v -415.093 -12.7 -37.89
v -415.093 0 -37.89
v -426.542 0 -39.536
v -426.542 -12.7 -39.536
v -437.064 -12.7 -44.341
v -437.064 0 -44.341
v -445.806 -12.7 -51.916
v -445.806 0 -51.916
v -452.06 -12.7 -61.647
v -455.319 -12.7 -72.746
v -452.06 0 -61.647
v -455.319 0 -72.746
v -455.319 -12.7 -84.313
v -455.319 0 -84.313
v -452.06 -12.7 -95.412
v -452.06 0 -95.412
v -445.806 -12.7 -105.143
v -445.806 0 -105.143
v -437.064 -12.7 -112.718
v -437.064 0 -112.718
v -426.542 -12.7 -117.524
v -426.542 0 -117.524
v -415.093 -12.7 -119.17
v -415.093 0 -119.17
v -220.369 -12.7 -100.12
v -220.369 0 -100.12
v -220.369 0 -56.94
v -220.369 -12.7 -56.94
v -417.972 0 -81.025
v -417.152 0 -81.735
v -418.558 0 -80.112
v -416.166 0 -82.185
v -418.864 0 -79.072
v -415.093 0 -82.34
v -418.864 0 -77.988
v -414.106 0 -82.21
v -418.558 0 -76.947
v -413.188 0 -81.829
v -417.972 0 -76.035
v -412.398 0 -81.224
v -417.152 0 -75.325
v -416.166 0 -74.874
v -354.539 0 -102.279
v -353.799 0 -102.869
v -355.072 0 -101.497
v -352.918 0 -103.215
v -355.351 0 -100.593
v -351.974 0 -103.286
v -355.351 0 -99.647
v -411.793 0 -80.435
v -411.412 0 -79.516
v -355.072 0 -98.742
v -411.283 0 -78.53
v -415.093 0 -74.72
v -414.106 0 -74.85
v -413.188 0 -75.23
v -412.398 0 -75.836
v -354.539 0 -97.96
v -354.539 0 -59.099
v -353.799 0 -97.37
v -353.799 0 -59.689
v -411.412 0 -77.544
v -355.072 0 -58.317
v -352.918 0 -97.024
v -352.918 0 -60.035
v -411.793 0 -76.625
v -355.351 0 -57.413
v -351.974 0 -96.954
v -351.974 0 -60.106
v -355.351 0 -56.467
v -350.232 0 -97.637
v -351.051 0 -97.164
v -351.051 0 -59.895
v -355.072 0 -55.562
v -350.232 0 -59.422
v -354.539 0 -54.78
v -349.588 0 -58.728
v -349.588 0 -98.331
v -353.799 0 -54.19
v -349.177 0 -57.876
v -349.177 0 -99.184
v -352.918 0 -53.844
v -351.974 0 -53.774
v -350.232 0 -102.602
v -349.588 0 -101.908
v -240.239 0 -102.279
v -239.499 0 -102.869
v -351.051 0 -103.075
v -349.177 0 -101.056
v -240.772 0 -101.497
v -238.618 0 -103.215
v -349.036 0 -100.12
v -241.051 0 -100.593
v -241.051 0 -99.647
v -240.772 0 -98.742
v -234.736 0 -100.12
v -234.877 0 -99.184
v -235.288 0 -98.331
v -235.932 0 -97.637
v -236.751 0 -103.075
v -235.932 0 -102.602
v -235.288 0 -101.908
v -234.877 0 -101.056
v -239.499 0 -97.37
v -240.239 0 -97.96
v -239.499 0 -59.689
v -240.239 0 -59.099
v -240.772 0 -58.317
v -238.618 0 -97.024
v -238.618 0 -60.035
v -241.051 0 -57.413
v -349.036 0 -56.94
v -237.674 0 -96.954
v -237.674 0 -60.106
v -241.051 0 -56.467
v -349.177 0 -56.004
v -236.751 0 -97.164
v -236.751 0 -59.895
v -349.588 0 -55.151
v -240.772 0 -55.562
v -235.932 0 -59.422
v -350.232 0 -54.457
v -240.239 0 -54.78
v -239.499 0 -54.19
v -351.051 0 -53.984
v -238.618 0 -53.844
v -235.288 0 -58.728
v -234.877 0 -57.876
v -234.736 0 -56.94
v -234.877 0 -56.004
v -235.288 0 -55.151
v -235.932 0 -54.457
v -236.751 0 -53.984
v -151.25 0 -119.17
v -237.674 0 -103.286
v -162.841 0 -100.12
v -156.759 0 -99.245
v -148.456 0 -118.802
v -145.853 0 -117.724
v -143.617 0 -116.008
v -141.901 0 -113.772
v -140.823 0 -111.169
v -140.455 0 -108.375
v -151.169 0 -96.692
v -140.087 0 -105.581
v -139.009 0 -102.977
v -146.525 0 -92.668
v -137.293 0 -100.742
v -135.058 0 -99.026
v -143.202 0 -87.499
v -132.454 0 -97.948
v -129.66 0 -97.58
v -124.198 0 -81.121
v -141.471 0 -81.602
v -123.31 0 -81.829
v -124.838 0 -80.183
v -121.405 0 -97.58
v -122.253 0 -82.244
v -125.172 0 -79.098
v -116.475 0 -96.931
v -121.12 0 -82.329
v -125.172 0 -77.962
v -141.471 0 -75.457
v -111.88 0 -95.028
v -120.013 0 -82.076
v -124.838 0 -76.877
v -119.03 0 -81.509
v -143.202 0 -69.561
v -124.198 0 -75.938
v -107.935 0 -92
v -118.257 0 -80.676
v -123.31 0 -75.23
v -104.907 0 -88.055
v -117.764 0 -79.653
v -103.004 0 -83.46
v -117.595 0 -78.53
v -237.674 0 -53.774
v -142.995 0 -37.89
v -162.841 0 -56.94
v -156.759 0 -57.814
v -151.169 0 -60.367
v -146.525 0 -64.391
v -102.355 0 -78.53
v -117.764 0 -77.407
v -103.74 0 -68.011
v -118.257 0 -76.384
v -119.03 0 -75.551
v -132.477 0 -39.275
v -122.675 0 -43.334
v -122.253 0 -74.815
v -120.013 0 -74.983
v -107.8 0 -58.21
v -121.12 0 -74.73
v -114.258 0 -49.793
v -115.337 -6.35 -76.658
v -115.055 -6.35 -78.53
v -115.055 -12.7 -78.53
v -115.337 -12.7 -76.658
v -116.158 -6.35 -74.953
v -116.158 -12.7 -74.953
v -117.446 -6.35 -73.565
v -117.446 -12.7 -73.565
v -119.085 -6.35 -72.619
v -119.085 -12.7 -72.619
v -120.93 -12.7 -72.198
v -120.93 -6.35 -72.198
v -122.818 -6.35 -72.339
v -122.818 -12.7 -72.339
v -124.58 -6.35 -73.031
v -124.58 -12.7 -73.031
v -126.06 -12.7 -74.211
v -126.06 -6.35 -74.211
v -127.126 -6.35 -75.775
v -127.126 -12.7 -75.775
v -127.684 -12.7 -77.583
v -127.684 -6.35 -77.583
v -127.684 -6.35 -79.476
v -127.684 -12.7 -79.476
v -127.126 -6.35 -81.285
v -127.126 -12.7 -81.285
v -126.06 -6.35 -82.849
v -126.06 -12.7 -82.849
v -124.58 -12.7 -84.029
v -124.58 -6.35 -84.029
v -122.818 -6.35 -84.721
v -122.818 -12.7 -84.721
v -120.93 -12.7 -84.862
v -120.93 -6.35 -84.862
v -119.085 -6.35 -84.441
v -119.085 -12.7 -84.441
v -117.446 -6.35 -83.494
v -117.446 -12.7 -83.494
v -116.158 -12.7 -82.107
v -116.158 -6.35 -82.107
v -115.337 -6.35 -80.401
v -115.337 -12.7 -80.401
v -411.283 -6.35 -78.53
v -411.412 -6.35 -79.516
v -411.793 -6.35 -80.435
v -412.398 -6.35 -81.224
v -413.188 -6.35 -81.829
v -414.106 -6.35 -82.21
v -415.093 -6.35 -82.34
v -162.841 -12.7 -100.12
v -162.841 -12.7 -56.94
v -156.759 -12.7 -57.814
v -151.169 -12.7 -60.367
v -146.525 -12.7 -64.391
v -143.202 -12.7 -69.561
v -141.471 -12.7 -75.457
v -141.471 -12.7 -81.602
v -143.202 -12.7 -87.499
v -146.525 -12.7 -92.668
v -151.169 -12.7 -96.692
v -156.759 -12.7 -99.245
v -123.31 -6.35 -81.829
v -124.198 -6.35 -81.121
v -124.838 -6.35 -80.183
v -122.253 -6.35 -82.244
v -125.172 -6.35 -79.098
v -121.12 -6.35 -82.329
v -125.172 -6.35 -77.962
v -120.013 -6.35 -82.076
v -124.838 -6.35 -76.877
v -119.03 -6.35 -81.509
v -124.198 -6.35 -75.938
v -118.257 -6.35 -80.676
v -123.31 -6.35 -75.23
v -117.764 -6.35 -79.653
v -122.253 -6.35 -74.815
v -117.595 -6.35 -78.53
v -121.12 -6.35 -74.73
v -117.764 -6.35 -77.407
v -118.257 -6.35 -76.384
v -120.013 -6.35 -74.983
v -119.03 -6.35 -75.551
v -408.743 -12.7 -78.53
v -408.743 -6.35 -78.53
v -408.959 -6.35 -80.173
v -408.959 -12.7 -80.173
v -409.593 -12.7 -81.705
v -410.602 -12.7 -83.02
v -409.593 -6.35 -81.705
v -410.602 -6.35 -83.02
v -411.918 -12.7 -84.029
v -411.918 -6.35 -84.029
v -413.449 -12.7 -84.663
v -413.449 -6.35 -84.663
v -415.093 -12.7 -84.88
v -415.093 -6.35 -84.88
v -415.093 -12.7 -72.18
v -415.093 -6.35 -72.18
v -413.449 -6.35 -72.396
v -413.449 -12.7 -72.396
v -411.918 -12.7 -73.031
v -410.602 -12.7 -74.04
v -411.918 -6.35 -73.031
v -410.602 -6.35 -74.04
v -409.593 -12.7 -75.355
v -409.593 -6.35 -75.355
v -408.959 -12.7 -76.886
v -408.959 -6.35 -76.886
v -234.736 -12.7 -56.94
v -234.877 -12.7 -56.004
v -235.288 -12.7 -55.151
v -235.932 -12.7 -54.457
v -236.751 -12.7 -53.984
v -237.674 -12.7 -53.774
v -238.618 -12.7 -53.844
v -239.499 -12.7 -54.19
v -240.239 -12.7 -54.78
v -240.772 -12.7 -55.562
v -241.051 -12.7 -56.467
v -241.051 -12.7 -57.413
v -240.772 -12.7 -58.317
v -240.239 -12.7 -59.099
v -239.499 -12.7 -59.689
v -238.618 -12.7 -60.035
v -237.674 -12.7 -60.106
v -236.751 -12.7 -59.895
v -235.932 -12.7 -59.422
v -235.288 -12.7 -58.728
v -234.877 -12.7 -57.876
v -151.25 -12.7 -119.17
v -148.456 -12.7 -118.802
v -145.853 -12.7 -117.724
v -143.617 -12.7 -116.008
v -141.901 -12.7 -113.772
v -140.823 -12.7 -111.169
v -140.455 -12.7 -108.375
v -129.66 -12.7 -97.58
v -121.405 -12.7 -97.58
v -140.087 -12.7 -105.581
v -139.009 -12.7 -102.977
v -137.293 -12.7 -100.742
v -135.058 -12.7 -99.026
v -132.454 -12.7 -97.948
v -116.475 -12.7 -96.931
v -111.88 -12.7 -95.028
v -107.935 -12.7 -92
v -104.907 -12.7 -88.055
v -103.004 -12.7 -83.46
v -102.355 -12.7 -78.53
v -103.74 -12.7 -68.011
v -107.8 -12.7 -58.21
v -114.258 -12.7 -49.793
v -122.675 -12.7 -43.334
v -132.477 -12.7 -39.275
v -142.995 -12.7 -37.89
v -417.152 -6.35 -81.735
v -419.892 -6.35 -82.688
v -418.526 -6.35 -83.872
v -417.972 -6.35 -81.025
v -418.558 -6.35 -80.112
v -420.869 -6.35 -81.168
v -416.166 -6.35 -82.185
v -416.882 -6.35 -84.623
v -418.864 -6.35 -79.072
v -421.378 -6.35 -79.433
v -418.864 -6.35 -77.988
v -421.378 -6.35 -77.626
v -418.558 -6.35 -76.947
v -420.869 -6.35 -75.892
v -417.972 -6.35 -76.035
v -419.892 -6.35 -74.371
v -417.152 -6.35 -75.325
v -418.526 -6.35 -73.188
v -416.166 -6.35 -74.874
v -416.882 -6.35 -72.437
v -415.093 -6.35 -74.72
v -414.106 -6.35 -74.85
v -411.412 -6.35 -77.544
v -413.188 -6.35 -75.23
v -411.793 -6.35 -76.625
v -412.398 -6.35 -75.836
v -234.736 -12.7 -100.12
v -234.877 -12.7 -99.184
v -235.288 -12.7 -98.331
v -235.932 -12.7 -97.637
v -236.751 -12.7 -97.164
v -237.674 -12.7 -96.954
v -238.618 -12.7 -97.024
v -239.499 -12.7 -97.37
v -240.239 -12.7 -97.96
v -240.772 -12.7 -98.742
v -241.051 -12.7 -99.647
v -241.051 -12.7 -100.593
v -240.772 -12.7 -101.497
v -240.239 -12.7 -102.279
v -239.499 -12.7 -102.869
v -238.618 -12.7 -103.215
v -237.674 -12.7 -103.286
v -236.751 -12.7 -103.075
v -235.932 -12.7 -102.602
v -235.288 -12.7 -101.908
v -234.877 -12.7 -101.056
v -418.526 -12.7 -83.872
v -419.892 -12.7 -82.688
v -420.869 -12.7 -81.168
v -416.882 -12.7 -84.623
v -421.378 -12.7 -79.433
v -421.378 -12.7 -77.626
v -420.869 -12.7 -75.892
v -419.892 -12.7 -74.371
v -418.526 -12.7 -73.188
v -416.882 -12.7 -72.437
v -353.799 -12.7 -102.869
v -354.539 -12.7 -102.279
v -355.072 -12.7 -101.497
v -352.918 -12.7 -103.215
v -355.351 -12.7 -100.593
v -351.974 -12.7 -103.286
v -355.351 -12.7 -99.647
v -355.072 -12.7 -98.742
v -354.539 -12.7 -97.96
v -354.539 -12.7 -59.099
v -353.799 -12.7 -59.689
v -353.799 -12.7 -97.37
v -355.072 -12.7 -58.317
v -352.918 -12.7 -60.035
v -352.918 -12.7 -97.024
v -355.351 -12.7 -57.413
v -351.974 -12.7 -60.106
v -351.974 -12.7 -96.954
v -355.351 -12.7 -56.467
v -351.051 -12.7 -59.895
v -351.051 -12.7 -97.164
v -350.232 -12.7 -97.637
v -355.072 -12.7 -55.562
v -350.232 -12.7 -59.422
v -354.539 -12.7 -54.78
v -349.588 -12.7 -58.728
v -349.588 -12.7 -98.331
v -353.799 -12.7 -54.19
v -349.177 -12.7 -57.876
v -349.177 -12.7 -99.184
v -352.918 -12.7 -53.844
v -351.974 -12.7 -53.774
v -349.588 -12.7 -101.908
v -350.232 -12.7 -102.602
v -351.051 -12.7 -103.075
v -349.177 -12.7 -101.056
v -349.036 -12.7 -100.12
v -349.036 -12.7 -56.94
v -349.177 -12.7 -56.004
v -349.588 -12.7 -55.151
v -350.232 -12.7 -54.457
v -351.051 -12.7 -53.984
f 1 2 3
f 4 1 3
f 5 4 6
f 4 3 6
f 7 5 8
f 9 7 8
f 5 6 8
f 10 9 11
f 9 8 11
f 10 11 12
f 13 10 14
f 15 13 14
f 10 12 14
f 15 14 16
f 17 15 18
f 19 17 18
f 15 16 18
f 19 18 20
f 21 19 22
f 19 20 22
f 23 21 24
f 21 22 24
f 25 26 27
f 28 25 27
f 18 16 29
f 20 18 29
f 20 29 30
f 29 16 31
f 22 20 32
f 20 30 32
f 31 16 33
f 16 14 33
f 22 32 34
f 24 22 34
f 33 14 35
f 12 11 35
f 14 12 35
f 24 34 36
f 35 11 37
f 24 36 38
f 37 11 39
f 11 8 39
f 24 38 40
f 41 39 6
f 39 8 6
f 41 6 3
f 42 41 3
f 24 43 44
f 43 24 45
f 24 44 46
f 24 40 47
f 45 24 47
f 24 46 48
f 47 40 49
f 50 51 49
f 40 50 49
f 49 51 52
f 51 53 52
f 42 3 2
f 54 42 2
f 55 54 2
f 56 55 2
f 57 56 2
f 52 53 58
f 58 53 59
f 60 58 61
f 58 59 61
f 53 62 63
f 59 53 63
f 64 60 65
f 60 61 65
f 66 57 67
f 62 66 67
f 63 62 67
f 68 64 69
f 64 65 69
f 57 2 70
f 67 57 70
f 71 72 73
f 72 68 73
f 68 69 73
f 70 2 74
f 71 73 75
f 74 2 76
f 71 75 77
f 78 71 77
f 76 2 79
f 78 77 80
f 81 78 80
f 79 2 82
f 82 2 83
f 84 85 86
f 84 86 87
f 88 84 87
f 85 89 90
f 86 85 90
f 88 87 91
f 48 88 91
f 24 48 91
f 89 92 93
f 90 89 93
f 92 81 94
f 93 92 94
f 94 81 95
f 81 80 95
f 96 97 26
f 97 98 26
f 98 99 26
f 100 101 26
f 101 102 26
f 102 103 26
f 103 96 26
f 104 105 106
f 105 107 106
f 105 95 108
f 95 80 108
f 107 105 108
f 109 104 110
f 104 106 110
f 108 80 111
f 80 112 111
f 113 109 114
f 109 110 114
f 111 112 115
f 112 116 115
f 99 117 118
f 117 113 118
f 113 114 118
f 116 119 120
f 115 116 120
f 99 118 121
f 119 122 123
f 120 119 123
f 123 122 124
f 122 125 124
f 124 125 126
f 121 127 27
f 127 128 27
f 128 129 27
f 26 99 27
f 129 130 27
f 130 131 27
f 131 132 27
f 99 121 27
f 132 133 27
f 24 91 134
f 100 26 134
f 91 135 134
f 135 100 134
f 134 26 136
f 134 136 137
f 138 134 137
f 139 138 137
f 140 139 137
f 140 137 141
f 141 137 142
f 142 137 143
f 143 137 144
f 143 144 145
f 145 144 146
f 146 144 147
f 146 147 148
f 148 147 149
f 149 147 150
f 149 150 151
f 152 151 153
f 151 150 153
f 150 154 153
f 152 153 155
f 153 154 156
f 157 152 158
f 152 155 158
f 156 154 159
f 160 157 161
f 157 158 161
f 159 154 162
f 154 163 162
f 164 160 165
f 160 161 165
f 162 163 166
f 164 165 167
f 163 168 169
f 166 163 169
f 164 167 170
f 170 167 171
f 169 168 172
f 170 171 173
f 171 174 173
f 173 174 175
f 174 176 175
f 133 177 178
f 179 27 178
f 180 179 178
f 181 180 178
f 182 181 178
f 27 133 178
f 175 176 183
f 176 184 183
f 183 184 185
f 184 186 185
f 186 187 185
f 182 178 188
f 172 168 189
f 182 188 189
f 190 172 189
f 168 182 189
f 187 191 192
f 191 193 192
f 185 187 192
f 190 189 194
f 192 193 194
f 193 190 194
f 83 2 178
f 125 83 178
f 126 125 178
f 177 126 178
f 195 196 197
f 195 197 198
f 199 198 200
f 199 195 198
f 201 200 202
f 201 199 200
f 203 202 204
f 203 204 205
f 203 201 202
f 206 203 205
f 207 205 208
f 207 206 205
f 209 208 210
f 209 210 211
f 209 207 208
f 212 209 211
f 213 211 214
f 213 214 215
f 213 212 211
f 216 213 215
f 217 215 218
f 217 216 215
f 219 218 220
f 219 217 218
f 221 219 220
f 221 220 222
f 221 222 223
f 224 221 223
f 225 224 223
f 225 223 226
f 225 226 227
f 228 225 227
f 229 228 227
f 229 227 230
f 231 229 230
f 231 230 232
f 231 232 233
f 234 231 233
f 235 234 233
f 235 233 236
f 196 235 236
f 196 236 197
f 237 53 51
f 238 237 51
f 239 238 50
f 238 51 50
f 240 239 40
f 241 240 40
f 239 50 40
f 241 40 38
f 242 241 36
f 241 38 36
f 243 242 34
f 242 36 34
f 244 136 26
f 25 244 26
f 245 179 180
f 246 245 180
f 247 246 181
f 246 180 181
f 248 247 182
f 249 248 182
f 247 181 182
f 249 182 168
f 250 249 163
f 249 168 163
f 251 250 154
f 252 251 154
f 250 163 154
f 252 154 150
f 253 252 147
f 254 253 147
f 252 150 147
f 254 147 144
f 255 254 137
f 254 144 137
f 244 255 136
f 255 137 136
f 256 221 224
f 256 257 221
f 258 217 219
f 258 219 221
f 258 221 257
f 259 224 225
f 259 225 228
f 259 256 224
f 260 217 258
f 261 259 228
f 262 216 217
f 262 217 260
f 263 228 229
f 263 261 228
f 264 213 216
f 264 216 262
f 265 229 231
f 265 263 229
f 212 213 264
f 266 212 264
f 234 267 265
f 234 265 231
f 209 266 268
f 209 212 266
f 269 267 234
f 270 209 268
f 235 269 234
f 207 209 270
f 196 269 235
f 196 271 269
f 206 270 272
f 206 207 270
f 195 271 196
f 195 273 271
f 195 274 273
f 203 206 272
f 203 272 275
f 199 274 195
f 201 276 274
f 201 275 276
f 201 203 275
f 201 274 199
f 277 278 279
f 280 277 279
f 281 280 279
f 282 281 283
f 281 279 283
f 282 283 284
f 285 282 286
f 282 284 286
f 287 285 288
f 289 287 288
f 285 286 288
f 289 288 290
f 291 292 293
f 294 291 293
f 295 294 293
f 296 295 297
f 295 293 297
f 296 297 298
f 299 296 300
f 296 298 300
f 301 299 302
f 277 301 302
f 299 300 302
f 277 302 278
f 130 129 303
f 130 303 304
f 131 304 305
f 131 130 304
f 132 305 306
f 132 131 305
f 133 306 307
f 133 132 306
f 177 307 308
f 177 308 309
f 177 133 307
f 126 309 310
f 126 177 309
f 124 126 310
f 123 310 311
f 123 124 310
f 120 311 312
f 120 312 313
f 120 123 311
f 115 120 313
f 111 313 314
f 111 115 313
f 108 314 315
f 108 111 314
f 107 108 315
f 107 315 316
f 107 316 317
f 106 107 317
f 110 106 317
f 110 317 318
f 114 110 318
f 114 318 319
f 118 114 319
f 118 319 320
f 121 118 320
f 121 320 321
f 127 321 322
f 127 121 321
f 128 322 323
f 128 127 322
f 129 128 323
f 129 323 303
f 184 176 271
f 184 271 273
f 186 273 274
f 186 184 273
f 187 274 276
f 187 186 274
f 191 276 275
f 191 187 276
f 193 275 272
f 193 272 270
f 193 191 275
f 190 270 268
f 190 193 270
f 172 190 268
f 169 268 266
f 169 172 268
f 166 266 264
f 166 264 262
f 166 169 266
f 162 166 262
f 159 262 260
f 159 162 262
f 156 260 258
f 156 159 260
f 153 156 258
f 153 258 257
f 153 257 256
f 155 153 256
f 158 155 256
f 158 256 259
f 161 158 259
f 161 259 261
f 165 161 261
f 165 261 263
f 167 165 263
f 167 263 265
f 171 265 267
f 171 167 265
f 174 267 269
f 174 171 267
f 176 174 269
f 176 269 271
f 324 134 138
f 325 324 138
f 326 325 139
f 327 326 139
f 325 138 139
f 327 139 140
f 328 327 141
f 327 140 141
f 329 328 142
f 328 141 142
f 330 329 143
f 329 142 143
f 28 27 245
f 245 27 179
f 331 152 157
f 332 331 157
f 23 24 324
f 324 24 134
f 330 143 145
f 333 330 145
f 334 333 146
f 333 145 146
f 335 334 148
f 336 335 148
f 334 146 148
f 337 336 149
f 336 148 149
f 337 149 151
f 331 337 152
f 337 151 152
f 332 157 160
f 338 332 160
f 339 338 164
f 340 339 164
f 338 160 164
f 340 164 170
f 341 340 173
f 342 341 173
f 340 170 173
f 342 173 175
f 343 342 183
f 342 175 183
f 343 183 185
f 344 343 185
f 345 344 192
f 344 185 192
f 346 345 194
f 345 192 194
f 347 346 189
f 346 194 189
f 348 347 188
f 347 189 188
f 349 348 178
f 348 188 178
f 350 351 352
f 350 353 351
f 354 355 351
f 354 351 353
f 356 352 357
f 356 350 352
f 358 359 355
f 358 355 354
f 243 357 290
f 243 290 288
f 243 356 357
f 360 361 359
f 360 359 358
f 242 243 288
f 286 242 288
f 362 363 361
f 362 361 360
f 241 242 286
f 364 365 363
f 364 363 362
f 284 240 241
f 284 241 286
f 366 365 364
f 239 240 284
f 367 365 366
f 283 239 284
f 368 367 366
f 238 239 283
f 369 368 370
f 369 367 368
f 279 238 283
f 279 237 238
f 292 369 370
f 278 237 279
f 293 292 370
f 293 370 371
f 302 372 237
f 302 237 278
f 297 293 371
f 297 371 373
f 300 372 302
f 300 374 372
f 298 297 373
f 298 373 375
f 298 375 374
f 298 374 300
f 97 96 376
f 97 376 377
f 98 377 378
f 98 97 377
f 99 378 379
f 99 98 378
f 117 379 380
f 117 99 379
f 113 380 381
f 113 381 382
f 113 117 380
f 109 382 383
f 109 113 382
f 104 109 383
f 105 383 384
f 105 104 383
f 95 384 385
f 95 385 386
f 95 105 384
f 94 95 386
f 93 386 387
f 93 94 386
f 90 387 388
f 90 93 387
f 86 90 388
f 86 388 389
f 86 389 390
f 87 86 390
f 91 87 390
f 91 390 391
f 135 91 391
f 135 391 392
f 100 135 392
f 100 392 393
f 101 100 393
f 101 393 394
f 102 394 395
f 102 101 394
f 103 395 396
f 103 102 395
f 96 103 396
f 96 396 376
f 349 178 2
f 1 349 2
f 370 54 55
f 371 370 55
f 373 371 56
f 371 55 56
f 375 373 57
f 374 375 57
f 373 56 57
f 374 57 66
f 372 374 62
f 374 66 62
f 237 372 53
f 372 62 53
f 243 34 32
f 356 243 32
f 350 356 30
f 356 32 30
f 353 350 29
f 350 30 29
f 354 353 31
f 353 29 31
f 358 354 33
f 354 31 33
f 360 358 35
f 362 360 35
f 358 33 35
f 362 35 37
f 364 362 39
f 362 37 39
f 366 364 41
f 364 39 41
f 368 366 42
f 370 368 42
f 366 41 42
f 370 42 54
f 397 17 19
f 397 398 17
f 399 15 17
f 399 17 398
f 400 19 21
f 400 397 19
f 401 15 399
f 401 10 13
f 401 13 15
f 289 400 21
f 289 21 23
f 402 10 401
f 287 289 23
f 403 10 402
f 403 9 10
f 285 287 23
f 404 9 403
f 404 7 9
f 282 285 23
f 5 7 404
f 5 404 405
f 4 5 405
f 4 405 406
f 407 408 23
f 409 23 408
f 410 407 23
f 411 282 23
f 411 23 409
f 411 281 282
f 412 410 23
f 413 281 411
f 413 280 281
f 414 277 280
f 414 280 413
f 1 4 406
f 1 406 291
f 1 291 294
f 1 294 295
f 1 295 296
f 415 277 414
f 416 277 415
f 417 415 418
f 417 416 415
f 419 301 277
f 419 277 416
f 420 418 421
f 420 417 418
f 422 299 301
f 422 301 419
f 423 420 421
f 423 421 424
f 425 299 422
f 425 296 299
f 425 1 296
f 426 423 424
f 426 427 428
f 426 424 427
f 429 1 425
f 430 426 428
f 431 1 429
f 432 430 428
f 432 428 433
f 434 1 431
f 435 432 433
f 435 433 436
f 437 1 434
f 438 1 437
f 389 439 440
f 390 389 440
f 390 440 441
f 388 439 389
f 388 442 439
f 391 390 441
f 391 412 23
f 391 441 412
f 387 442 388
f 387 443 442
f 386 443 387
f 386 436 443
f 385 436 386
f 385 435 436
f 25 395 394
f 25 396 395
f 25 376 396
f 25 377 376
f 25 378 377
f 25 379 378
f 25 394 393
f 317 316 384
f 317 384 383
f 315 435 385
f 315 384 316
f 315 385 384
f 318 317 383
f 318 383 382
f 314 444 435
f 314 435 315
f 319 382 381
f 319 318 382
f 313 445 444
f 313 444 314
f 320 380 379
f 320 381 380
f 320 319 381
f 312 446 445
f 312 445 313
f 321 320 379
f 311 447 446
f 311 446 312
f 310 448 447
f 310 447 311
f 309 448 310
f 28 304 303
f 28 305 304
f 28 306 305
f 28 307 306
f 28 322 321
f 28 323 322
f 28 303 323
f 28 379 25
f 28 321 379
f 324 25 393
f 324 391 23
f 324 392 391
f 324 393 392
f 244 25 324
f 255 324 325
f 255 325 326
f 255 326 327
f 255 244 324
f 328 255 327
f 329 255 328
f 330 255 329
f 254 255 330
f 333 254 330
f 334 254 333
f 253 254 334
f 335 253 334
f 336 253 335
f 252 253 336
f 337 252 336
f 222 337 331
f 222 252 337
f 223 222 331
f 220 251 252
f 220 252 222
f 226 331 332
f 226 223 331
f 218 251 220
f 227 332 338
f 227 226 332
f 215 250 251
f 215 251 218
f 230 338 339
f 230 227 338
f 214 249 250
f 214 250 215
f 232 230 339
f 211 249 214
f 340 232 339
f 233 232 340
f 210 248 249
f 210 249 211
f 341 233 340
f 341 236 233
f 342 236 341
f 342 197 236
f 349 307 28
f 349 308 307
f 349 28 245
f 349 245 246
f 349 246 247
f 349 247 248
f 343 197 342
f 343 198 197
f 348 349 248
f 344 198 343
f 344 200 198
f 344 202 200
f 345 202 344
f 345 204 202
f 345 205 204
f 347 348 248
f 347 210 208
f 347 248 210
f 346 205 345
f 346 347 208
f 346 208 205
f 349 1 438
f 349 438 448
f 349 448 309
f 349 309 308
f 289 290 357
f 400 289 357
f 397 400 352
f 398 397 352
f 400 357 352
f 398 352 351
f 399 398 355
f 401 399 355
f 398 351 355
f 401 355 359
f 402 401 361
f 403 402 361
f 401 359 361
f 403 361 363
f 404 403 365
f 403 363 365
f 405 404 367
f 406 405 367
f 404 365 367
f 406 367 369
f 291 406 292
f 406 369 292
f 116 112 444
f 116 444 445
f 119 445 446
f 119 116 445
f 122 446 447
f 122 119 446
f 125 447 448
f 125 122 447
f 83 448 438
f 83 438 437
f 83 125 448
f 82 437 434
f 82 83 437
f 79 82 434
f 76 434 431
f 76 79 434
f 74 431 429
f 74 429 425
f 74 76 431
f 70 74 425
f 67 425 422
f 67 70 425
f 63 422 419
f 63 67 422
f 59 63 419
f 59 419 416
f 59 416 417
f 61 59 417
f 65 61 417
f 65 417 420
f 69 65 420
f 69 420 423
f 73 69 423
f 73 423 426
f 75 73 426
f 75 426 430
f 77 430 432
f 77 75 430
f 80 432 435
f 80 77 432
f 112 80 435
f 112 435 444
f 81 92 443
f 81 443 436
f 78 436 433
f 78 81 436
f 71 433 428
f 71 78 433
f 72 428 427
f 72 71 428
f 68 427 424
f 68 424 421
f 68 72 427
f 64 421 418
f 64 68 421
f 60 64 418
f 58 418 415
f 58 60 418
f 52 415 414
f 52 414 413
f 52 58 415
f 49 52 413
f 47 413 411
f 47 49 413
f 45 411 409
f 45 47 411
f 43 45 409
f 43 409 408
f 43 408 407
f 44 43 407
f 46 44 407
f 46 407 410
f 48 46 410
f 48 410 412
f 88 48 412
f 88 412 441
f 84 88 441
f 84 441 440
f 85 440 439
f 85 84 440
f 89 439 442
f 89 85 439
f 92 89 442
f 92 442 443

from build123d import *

# Parameters (mm, degrees)
F0_R     = 3.175
F0_R_2   = 6.35
F1_DEPTH = 12.7
F2_DEPTH = 6.35
F0_R_3   = 3.81
F3_DEPTH = 6.35


with BuildPart() as f1:
    # F0 (on Front) → F1 (new body)
    with BuildSketch(Plane.XZ):
        with BuildLine():
            ThreePointArc((-140.4550125721, -108.3747648736), (-137.293230275, -100.7415471707), (-129.6600125721, -97.5797648736))
            Line((-129.6600125721, -97.5797648736), (-122.9925125721, -97.5797648736))
            Line((-122.9925125721, -97.5797648736), (-121.4050125721, -97.5797648736))
            ThreePointArc((-121.4050125721, -97.5797648736), (-107.9346283905, -92.0001490552), (-102.3550125721, -78.5297648736))
            ThreePointArc((-102.3550125721, -78.5297648736), (-114.2581929847, -49.7929452862), (-142.9950125721, -37.8897648736))
            Line((-142.9950125721, -37.8897648736), (-150.1512528809, -37.8897648736))
            Line((-150.1512528809, -37.8897648736), (-415.0925125721, -37.8897648736))
            Line((-415.0925125721, -37.8897648736), (-415.0925125721, -72.1797648736))
            ThreePointArc((-415.0925125721, -72.1797648736), (-410.6023845116, -74.0396368131), (-408.7425125721, -78.5297648736))
            ThreePointArc((-408.7425125721, -78.5297648736), (-410.6023845116, -83.0198929341), (-415.0925125721, -84.8797648736))
            Line((-415.0925125721, -84.8797648736), (-415.0925125721, -119.1697648736))
            Line((-415.0925125721, -119.1697648736), (-151.2500125721, -119.1697648736))
            ThreePointArc((-151.2500125721, -119.1697648736), (-143.6167948692, -116.0079825765), (-140.4550125721, -108.3747648736))
        make_face()
        with Locations((-352.2111295721, -100.1197648736)):
            Circle(F0_R, mode=Mode.SUBTRACT)
        with Locations((-237.9111295721, -100.1197648736)):
            Circle(F0_R, mode=Mode.SUBTRACT)
        with BuildLine():
            ThreePointArc((-162.8412207992, -56.9397648736), (-141.2512207992, -78.5297648736), (-162.8412207992, -100.1197648736))
            Line((-162.8412207992, -100.1197648736), (-220.3693254323, -100.1197648736))
            Line((-220.3693254323, -100.1197648736), (-220.3693254323, -56.9397648736))
            Line((-220.3693254323, -56.9397648736), (-162.8412207992, -56.9397648736))
        make_face(mode=Mode.SUBTRACT)
        with Locations((-121.4050125721, -78.5297648736)):
            Circle(F0_R_2, mode=Mode.SUBTRACT)
        with Locations((-352.2111295721, -56.9397648736)):
            Circle(F0_R, mode=Mode.SUBTRACT)
        with Locations((-237.9111295721, -56.9397648736)):
            Circle(F0_R, mode=Mode.SUBTRACT)
        with BuildLine():
            ThreePointArc((-415.0925125721, -37.8897648736), (-455.7325125721, -78.5297648736), (-415.0925125721, -119.1697648736))
            Line((-415.0925125721, -119.1697648736), (-415.0925125721, -84.8797648736))
            ThreePointArc((-415.0925125721, -84.8797648736), (-421.4425125721, -78.5297648736), (-415.0925125721, -72.1797648736))
            Line((-415.0925125721, -72.1797648736), (-415.0925125721, -37.8897648736))
        make_face()
    extrude(amount=F1_DEPTH)

    # F0 (on Front) → F2 (join)
    with BuildSketch(Plane.XZ):
        with BuildLine():
            ThreePointArc((-415.0925125721, -72.1797648736), (-421.4425125721, -78.5297648736), (-415.0925125721, -84.8797648736))
            Line((-415.0925125721, -84.8797648736), (-415.0925125721, -82.3397648736))
            ThreePointArc((-415.0925125721, -82.3397648736), (-418.9025125721, -78.5297648736), (-415.0925125721, -74.7197648736))
            Line((-415.0925125721, -74.7197648736), (-415.0925125721, -72.1797648736))
        make_face()
        with BuildLine():
            Line((-415.0925125721, -82.3397648736), (-415.0925125721, -84.8797648736))
            ThreePointArc((-415.0925125721, -84.8797648736), (-410.6023845116, -83.0198929341), (-408.7425125721, -78.5297648736))
            ThreePointArc((-408.7425125721, -78.5297648736), (-410.6023845116, -74.0396368131), (-415.0925125721, -72.1797648736))
            Line((-415.0925125721, -72.1797648736), (-415.0925125721, -74.7197648736))
            ThreePointArc((-415.0925125721, -74.7197648736), (-412.3984357358, -75.8356880373), (-411.2825125721, -78.5297648736))
            ThreePointArc((-411.2825125721, -78.5297648736), (-412.3984357358, -81.2238417099), (-415.0925125721, -82.3397648736))
        make_face()
    extrude(amount=F2_DEPTH)

    # F0 (on Front) → F3 (join)
    with BuildSketch(Plane.XZ):
        with Locations((-121.4050125721, -78.5297648736)):
            Circle(F0_R_2)
        with Locations((-121.4050125721, -78.5297648736)):
            Circle(F0_R_3, mode=Mode.SUBTRACT)
    extrude(amount=F3_DEPTH)


solid = f1.part
